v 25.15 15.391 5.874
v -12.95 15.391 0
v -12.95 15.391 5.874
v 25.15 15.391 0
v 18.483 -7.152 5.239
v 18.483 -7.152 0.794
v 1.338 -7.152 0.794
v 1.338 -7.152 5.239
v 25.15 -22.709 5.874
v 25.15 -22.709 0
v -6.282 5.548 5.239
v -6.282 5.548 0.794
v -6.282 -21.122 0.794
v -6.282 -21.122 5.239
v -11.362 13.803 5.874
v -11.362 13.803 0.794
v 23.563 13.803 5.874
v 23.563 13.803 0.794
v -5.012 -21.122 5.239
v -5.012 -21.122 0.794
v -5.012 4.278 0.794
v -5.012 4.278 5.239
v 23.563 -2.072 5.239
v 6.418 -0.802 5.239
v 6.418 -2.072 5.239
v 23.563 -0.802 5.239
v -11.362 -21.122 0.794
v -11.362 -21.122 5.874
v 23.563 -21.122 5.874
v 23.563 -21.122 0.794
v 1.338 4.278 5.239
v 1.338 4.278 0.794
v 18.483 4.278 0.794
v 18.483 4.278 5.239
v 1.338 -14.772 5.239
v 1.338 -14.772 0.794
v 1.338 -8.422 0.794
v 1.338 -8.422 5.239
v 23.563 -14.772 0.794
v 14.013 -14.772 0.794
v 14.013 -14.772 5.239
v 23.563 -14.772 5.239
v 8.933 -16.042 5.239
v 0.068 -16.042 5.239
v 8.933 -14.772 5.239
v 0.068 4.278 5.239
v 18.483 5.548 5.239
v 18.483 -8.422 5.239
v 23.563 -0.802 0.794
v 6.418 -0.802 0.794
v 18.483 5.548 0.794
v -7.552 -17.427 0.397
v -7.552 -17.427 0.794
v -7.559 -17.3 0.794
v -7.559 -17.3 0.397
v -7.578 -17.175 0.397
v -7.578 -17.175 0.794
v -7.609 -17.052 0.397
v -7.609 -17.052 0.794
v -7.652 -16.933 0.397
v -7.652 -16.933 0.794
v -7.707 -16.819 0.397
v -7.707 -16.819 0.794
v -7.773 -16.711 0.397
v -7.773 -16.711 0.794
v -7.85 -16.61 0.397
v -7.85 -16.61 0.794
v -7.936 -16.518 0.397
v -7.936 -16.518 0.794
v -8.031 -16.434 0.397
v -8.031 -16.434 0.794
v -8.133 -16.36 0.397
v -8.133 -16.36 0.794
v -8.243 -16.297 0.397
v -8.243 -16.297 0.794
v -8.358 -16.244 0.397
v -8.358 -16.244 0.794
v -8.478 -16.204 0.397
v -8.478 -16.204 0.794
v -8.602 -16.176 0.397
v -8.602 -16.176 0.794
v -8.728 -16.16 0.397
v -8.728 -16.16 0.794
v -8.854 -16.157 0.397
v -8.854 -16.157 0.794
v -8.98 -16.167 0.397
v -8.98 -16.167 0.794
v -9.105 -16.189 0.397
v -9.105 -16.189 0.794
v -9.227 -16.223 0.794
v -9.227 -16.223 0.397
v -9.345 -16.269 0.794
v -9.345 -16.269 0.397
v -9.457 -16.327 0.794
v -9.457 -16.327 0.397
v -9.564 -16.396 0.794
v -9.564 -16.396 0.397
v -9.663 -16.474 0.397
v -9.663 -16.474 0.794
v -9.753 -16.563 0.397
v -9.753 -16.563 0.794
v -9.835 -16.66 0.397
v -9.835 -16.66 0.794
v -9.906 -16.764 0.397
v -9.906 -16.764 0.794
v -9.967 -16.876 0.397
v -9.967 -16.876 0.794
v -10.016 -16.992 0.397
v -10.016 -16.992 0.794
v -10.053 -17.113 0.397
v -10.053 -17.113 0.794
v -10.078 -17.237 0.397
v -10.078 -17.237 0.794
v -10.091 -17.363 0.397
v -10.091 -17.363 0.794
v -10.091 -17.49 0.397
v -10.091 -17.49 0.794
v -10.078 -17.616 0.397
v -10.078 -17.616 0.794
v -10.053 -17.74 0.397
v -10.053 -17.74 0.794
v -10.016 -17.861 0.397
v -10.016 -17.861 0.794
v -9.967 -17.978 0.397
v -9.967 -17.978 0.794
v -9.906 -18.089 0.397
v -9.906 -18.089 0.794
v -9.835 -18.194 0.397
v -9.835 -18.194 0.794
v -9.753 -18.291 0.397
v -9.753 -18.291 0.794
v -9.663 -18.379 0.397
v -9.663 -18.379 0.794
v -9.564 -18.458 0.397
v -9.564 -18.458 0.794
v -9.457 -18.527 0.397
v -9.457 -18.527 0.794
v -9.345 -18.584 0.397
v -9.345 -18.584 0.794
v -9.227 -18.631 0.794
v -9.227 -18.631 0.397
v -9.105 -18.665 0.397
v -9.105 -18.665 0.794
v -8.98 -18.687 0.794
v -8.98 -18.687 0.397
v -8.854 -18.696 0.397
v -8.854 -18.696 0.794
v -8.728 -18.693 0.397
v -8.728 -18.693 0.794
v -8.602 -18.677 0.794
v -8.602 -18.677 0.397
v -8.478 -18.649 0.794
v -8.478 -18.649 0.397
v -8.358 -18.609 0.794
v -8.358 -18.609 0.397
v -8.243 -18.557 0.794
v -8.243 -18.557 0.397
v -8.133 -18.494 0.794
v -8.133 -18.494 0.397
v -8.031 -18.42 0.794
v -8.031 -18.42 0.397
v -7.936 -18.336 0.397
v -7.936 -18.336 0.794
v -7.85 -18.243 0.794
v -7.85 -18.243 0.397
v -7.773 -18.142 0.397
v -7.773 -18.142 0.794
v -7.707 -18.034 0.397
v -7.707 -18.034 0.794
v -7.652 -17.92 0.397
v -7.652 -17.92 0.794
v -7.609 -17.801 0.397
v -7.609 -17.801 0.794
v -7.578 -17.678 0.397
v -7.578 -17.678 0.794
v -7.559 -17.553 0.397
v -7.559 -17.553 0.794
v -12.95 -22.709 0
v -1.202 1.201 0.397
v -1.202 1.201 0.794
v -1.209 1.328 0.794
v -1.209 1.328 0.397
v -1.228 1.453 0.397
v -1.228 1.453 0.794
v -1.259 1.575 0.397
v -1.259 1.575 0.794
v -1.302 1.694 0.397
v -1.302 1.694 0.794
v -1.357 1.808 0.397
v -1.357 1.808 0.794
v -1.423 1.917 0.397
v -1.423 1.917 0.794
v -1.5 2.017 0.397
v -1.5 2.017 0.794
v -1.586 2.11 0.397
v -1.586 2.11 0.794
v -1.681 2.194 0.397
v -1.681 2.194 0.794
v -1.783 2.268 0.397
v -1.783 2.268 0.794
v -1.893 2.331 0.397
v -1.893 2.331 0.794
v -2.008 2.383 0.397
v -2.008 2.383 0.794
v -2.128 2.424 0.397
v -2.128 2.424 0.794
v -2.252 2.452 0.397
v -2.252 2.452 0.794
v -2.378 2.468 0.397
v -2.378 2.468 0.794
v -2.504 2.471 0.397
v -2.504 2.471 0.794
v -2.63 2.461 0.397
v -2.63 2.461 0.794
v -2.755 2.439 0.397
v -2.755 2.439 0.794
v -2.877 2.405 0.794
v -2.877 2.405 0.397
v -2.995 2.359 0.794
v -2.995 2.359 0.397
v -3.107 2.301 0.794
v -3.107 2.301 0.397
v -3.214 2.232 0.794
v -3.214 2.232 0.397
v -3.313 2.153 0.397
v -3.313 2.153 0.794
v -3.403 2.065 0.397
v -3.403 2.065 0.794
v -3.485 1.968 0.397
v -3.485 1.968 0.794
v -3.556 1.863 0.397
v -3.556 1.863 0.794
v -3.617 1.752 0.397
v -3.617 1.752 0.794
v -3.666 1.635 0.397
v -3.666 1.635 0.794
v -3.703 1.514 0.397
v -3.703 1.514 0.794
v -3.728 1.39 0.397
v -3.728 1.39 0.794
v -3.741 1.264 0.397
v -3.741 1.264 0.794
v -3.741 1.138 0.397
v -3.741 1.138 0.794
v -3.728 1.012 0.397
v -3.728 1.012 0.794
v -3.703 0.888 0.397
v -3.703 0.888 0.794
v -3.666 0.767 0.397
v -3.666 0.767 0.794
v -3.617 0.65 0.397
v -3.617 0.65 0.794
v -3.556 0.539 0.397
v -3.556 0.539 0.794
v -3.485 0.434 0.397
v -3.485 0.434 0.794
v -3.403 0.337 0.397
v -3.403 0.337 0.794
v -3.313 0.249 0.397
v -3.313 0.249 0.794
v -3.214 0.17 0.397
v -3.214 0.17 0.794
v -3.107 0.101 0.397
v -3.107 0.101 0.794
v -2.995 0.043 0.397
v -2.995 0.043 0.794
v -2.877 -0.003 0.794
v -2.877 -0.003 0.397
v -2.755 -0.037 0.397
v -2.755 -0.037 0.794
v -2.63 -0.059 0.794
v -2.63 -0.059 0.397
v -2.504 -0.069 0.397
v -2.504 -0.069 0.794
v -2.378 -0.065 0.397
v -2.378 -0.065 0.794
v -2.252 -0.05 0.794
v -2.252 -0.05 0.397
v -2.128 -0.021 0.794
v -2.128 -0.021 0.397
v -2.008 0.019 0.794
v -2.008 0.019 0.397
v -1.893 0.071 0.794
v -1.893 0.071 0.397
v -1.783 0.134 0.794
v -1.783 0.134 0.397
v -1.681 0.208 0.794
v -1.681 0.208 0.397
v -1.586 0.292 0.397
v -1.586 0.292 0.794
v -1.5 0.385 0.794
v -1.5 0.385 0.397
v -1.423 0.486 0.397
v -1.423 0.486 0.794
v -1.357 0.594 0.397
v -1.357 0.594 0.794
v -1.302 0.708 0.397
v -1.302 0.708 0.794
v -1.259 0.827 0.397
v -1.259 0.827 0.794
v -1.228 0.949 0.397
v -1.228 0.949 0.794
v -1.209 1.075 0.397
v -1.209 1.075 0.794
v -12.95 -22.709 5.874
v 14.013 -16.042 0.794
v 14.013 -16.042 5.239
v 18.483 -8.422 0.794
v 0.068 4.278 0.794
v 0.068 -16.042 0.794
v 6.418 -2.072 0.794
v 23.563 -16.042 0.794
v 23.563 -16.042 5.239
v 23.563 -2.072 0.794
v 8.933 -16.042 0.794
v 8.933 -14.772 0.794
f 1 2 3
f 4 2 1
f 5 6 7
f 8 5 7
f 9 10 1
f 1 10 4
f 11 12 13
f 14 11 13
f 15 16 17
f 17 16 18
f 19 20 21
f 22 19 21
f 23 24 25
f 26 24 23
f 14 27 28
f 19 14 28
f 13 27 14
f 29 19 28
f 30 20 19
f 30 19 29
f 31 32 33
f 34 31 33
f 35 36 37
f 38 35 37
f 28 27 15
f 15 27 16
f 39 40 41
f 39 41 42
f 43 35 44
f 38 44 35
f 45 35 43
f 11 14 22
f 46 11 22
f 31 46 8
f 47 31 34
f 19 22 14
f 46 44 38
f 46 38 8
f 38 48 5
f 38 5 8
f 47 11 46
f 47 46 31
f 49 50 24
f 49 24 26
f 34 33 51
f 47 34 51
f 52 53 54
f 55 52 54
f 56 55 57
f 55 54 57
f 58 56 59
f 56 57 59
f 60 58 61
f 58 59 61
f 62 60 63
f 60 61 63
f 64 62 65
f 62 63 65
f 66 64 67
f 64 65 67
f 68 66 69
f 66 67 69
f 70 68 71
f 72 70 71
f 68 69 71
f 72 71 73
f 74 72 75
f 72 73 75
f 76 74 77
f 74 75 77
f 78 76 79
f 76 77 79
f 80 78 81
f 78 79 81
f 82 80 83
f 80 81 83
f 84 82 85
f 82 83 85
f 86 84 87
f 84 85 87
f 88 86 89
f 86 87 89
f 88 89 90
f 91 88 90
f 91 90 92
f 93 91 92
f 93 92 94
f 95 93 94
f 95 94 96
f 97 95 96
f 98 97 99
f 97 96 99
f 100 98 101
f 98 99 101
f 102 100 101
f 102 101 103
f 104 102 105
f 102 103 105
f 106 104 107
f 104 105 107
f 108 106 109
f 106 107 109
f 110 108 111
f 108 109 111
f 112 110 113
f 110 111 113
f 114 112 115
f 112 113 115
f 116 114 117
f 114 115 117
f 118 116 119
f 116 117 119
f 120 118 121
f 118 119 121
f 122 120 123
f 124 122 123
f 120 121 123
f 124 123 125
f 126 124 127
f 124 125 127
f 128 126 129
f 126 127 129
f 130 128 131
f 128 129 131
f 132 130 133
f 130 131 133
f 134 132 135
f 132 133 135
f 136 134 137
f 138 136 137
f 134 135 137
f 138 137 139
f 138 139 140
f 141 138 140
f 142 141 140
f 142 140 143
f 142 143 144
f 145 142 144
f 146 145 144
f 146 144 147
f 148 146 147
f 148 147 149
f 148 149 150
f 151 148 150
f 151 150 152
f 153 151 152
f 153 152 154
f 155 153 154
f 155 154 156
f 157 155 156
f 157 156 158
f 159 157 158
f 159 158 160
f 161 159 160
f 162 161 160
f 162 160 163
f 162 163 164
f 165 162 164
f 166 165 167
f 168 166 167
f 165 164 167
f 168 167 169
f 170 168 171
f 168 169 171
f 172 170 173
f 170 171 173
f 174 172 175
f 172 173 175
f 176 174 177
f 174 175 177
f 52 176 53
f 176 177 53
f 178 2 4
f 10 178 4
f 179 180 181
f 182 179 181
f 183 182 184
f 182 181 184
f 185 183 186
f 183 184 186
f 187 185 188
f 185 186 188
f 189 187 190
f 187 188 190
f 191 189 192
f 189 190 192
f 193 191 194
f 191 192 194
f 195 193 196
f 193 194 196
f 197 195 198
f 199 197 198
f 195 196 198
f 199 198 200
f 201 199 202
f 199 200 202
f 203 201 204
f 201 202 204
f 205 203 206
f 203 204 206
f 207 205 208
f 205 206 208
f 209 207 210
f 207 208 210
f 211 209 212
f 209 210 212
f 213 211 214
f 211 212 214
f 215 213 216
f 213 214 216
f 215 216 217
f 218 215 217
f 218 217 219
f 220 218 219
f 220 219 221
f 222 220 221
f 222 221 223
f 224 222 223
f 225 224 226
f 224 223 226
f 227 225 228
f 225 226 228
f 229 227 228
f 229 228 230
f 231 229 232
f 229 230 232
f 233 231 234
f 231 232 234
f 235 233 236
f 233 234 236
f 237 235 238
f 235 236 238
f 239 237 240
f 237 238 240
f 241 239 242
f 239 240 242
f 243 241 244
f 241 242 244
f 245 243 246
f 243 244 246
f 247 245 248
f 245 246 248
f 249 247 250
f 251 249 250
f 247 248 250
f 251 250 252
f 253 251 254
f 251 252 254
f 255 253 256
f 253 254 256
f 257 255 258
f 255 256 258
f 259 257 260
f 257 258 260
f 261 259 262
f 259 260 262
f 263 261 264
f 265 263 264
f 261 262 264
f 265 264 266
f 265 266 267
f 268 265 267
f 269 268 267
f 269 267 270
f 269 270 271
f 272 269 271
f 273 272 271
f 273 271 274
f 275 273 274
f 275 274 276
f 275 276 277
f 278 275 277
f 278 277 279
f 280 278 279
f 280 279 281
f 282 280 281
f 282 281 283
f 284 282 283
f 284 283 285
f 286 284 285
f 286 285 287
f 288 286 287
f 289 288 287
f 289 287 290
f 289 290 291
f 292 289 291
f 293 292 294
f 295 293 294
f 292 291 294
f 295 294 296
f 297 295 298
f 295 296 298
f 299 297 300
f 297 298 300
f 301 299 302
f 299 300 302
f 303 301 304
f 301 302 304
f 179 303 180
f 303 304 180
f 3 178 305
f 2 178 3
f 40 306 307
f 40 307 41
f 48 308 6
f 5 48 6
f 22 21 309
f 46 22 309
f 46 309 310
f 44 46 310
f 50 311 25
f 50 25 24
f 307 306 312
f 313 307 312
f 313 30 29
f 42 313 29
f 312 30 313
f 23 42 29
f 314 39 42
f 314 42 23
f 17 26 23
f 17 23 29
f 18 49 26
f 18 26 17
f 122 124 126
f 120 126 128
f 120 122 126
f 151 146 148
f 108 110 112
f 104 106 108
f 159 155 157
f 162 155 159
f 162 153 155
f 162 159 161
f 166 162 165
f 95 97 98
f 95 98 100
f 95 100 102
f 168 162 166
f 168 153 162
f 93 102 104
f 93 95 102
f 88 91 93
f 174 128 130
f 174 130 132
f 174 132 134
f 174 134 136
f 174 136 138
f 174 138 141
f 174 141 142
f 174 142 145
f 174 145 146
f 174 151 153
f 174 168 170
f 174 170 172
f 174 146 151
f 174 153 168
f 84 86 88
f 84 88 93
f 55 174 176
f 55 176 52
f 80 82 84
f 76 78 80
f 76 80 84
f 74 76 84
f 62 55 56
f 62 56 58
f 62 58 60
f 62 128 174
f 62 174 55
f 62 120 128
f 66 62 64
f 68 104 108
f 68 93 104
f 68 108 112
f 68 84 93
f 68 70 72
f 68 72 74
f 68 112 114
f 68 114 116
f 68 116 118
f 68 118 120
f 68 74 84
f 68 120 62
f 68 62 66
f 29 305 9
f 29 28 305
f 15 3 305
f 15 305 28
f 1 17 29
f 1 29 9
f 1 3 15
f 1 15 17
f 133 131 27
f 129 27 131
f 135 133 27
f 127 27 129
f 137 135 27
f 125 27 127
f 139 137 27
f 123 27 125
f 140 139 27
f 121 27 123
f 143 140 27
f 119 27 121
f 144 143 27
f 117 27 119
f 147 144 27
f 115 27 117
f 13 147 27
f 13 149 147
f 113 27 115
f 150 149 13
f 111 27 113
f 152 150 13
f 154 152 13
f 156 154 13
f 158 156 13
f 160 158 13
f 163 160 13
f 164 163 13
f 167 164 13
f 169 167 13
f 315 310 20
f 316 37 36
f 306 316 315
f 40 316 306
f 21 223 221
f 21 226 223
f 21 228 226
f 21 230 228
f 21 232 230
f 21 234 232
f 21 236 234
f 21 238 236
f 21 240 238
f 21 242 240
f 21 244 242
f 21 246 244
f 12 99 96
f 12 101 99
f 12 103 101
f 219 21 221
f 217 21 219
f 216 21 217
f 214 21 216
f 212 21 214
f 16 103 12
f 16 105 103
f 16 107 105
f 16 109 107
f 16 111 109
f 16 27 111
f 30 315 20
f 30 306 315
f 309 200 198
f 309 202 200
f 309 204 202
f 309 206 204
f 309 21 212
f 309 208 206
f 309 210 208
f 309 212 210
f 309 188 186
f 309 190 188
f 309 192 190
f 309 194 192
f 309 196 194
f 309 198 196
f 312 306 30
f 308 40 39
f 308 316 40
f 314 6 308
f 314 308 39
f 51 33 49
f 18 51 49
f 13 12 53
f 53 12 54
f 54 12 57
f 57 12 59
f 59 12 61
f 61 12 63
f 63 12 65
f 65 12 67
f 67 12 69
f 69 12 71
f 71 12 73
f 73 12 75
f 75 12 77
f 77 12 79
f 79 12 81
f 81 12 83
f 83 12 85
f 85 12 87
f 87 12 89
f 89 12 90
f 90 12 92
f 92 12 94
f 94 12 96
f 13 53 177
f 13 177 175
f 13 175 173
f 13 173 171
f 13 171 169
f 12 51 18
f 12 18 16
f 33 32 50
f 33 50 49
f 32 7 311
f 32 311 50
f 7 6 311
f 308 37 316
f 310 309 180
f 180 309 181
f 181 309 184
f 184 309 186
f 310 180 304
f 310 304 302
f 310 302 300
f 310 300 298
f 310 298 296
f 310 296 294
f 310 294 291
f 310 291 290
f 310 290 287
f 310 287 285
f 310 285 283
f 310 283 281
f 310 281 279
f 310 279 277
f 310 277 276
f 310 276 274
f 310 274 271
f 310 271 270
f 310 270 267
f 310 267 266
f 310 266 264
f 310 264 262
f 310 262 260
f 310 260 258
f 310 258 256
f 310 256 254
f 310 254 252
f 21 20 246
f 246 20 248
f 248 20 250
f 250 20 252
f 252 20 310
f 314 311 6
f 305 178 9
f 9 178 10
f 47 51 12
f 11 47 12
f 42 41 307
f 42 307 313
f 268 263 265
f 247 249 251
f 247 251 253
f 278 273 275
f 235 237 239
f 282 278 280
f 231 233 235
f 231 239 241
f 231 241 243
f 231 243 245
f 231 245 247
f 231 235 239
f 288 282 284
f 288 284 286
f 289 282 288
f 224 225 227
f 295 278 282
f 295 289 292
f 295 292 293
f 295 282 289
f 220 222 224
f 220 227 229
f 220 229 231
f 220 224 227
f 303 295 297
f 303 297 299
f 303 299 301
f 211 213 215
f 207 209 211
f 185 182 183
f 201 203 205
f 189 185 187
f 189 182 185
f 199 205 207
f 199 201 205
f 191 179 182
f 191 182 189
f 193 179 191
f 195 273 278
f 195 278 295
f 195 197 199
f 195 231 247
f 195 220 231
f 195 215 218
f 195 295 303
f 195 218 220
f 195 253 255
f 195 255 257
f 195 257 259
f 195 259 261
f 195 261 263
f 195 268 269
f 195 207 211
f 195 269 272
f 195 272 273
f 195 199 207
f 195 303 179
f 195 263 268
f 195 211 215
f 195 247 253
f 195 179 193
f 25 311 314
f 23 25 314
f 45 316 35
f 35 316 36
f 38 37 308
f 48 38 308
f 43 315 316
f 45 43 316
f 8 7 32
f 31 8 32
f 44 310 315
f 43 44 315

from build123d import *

# Parameters (mm, degrees)
F0_W     = 38.1
F0_H     = 38.1
F1_DEPTH = 0.79375
F2_W     = 38.1
F2_H     = 38.1
F2_W_2   = 34.925
F2_H_2   = 34.925
F3_DEPTH = 5.08
F4_W     = 17.145
F4_H     = 1.27
F4_W_2   = 9.5498631887
F5_DEPTH = 4.445
F4_R     = 1.27
F6_DEPTH = 0.396875


with BuildPart() as f1:
    # F0 (on Top) → F1 (new body)
    with BuildSketch(Plane.XY):
        with Locations((6.1000548303, -3.6594523599)):
            Rectangle(F0_W, F0_H)
    extrude(amount=F1_DEPTH)

    # F2 (on face) → F3 (join)
    with BuildSketch(Plane.XY.offset(0.79375)):
        with Locations((6.1000548303, -3.6594523599)):
            Rectangle(F2_W, F2_H)
        with Locations((6.1000548303, -3.6594523599)):
            Rectangle(F2_W_2, F2_H_2, mode=Mode.SUBTRACT)
    extrude(amount=F3_DEPTH)

    # F4 (on face) → F5 (join)
    with BuildSketch(Plane.XY.offset(0.79375)):
        Polygon((-6.2824451697, 5.5480476401), (-6.2824451697, -21.1219523599), (-5.0124451697, -21.1219523599), (-5.0124451697, 4.2780476401), (0.0675548303, 4.2780476401), (0.0675548303, -16.0419523599), (8.9326916416, -16.0419523599), (8.9326916416, -14.7719523599), (1.3375548303, -14.7719523599), (1.3375548303, -8.4219523599), (18.4825548303, -8.4219523599), (18.4825548303, -7.1519523599), (1.3375548303, -7.1519523599), (1.3375548303, 4.2780476401), (18.4825548303, 4.2780476401), (18.4825548303, 5.5480476401), (-5.0124451697, 5.5480476401), align=None)
        with Locations((14.9900548303, -1.4369523599)):
            Rectangle(F4_W, F4_H)
        with Locations((18.787623236, -15.4069523599)):
            Rectangle(F4_W_2, F4_H)
    extrude(amount=F5_DEPTH)

    # F4 (on face) → F6 (cut)
    with BuildSketch(Plane.XY.offset(0.79375)):
        with Locations((-8.8224451697, -17.4266919494)):
            Circle(F4_R)
        with Locations((-2.4724451697, 1.2010911014)):
            Circle(F4_R)
    extrude(amount=-F6_DEPTH, mode=Mode.SUBTRACT)


solid = f1.part
